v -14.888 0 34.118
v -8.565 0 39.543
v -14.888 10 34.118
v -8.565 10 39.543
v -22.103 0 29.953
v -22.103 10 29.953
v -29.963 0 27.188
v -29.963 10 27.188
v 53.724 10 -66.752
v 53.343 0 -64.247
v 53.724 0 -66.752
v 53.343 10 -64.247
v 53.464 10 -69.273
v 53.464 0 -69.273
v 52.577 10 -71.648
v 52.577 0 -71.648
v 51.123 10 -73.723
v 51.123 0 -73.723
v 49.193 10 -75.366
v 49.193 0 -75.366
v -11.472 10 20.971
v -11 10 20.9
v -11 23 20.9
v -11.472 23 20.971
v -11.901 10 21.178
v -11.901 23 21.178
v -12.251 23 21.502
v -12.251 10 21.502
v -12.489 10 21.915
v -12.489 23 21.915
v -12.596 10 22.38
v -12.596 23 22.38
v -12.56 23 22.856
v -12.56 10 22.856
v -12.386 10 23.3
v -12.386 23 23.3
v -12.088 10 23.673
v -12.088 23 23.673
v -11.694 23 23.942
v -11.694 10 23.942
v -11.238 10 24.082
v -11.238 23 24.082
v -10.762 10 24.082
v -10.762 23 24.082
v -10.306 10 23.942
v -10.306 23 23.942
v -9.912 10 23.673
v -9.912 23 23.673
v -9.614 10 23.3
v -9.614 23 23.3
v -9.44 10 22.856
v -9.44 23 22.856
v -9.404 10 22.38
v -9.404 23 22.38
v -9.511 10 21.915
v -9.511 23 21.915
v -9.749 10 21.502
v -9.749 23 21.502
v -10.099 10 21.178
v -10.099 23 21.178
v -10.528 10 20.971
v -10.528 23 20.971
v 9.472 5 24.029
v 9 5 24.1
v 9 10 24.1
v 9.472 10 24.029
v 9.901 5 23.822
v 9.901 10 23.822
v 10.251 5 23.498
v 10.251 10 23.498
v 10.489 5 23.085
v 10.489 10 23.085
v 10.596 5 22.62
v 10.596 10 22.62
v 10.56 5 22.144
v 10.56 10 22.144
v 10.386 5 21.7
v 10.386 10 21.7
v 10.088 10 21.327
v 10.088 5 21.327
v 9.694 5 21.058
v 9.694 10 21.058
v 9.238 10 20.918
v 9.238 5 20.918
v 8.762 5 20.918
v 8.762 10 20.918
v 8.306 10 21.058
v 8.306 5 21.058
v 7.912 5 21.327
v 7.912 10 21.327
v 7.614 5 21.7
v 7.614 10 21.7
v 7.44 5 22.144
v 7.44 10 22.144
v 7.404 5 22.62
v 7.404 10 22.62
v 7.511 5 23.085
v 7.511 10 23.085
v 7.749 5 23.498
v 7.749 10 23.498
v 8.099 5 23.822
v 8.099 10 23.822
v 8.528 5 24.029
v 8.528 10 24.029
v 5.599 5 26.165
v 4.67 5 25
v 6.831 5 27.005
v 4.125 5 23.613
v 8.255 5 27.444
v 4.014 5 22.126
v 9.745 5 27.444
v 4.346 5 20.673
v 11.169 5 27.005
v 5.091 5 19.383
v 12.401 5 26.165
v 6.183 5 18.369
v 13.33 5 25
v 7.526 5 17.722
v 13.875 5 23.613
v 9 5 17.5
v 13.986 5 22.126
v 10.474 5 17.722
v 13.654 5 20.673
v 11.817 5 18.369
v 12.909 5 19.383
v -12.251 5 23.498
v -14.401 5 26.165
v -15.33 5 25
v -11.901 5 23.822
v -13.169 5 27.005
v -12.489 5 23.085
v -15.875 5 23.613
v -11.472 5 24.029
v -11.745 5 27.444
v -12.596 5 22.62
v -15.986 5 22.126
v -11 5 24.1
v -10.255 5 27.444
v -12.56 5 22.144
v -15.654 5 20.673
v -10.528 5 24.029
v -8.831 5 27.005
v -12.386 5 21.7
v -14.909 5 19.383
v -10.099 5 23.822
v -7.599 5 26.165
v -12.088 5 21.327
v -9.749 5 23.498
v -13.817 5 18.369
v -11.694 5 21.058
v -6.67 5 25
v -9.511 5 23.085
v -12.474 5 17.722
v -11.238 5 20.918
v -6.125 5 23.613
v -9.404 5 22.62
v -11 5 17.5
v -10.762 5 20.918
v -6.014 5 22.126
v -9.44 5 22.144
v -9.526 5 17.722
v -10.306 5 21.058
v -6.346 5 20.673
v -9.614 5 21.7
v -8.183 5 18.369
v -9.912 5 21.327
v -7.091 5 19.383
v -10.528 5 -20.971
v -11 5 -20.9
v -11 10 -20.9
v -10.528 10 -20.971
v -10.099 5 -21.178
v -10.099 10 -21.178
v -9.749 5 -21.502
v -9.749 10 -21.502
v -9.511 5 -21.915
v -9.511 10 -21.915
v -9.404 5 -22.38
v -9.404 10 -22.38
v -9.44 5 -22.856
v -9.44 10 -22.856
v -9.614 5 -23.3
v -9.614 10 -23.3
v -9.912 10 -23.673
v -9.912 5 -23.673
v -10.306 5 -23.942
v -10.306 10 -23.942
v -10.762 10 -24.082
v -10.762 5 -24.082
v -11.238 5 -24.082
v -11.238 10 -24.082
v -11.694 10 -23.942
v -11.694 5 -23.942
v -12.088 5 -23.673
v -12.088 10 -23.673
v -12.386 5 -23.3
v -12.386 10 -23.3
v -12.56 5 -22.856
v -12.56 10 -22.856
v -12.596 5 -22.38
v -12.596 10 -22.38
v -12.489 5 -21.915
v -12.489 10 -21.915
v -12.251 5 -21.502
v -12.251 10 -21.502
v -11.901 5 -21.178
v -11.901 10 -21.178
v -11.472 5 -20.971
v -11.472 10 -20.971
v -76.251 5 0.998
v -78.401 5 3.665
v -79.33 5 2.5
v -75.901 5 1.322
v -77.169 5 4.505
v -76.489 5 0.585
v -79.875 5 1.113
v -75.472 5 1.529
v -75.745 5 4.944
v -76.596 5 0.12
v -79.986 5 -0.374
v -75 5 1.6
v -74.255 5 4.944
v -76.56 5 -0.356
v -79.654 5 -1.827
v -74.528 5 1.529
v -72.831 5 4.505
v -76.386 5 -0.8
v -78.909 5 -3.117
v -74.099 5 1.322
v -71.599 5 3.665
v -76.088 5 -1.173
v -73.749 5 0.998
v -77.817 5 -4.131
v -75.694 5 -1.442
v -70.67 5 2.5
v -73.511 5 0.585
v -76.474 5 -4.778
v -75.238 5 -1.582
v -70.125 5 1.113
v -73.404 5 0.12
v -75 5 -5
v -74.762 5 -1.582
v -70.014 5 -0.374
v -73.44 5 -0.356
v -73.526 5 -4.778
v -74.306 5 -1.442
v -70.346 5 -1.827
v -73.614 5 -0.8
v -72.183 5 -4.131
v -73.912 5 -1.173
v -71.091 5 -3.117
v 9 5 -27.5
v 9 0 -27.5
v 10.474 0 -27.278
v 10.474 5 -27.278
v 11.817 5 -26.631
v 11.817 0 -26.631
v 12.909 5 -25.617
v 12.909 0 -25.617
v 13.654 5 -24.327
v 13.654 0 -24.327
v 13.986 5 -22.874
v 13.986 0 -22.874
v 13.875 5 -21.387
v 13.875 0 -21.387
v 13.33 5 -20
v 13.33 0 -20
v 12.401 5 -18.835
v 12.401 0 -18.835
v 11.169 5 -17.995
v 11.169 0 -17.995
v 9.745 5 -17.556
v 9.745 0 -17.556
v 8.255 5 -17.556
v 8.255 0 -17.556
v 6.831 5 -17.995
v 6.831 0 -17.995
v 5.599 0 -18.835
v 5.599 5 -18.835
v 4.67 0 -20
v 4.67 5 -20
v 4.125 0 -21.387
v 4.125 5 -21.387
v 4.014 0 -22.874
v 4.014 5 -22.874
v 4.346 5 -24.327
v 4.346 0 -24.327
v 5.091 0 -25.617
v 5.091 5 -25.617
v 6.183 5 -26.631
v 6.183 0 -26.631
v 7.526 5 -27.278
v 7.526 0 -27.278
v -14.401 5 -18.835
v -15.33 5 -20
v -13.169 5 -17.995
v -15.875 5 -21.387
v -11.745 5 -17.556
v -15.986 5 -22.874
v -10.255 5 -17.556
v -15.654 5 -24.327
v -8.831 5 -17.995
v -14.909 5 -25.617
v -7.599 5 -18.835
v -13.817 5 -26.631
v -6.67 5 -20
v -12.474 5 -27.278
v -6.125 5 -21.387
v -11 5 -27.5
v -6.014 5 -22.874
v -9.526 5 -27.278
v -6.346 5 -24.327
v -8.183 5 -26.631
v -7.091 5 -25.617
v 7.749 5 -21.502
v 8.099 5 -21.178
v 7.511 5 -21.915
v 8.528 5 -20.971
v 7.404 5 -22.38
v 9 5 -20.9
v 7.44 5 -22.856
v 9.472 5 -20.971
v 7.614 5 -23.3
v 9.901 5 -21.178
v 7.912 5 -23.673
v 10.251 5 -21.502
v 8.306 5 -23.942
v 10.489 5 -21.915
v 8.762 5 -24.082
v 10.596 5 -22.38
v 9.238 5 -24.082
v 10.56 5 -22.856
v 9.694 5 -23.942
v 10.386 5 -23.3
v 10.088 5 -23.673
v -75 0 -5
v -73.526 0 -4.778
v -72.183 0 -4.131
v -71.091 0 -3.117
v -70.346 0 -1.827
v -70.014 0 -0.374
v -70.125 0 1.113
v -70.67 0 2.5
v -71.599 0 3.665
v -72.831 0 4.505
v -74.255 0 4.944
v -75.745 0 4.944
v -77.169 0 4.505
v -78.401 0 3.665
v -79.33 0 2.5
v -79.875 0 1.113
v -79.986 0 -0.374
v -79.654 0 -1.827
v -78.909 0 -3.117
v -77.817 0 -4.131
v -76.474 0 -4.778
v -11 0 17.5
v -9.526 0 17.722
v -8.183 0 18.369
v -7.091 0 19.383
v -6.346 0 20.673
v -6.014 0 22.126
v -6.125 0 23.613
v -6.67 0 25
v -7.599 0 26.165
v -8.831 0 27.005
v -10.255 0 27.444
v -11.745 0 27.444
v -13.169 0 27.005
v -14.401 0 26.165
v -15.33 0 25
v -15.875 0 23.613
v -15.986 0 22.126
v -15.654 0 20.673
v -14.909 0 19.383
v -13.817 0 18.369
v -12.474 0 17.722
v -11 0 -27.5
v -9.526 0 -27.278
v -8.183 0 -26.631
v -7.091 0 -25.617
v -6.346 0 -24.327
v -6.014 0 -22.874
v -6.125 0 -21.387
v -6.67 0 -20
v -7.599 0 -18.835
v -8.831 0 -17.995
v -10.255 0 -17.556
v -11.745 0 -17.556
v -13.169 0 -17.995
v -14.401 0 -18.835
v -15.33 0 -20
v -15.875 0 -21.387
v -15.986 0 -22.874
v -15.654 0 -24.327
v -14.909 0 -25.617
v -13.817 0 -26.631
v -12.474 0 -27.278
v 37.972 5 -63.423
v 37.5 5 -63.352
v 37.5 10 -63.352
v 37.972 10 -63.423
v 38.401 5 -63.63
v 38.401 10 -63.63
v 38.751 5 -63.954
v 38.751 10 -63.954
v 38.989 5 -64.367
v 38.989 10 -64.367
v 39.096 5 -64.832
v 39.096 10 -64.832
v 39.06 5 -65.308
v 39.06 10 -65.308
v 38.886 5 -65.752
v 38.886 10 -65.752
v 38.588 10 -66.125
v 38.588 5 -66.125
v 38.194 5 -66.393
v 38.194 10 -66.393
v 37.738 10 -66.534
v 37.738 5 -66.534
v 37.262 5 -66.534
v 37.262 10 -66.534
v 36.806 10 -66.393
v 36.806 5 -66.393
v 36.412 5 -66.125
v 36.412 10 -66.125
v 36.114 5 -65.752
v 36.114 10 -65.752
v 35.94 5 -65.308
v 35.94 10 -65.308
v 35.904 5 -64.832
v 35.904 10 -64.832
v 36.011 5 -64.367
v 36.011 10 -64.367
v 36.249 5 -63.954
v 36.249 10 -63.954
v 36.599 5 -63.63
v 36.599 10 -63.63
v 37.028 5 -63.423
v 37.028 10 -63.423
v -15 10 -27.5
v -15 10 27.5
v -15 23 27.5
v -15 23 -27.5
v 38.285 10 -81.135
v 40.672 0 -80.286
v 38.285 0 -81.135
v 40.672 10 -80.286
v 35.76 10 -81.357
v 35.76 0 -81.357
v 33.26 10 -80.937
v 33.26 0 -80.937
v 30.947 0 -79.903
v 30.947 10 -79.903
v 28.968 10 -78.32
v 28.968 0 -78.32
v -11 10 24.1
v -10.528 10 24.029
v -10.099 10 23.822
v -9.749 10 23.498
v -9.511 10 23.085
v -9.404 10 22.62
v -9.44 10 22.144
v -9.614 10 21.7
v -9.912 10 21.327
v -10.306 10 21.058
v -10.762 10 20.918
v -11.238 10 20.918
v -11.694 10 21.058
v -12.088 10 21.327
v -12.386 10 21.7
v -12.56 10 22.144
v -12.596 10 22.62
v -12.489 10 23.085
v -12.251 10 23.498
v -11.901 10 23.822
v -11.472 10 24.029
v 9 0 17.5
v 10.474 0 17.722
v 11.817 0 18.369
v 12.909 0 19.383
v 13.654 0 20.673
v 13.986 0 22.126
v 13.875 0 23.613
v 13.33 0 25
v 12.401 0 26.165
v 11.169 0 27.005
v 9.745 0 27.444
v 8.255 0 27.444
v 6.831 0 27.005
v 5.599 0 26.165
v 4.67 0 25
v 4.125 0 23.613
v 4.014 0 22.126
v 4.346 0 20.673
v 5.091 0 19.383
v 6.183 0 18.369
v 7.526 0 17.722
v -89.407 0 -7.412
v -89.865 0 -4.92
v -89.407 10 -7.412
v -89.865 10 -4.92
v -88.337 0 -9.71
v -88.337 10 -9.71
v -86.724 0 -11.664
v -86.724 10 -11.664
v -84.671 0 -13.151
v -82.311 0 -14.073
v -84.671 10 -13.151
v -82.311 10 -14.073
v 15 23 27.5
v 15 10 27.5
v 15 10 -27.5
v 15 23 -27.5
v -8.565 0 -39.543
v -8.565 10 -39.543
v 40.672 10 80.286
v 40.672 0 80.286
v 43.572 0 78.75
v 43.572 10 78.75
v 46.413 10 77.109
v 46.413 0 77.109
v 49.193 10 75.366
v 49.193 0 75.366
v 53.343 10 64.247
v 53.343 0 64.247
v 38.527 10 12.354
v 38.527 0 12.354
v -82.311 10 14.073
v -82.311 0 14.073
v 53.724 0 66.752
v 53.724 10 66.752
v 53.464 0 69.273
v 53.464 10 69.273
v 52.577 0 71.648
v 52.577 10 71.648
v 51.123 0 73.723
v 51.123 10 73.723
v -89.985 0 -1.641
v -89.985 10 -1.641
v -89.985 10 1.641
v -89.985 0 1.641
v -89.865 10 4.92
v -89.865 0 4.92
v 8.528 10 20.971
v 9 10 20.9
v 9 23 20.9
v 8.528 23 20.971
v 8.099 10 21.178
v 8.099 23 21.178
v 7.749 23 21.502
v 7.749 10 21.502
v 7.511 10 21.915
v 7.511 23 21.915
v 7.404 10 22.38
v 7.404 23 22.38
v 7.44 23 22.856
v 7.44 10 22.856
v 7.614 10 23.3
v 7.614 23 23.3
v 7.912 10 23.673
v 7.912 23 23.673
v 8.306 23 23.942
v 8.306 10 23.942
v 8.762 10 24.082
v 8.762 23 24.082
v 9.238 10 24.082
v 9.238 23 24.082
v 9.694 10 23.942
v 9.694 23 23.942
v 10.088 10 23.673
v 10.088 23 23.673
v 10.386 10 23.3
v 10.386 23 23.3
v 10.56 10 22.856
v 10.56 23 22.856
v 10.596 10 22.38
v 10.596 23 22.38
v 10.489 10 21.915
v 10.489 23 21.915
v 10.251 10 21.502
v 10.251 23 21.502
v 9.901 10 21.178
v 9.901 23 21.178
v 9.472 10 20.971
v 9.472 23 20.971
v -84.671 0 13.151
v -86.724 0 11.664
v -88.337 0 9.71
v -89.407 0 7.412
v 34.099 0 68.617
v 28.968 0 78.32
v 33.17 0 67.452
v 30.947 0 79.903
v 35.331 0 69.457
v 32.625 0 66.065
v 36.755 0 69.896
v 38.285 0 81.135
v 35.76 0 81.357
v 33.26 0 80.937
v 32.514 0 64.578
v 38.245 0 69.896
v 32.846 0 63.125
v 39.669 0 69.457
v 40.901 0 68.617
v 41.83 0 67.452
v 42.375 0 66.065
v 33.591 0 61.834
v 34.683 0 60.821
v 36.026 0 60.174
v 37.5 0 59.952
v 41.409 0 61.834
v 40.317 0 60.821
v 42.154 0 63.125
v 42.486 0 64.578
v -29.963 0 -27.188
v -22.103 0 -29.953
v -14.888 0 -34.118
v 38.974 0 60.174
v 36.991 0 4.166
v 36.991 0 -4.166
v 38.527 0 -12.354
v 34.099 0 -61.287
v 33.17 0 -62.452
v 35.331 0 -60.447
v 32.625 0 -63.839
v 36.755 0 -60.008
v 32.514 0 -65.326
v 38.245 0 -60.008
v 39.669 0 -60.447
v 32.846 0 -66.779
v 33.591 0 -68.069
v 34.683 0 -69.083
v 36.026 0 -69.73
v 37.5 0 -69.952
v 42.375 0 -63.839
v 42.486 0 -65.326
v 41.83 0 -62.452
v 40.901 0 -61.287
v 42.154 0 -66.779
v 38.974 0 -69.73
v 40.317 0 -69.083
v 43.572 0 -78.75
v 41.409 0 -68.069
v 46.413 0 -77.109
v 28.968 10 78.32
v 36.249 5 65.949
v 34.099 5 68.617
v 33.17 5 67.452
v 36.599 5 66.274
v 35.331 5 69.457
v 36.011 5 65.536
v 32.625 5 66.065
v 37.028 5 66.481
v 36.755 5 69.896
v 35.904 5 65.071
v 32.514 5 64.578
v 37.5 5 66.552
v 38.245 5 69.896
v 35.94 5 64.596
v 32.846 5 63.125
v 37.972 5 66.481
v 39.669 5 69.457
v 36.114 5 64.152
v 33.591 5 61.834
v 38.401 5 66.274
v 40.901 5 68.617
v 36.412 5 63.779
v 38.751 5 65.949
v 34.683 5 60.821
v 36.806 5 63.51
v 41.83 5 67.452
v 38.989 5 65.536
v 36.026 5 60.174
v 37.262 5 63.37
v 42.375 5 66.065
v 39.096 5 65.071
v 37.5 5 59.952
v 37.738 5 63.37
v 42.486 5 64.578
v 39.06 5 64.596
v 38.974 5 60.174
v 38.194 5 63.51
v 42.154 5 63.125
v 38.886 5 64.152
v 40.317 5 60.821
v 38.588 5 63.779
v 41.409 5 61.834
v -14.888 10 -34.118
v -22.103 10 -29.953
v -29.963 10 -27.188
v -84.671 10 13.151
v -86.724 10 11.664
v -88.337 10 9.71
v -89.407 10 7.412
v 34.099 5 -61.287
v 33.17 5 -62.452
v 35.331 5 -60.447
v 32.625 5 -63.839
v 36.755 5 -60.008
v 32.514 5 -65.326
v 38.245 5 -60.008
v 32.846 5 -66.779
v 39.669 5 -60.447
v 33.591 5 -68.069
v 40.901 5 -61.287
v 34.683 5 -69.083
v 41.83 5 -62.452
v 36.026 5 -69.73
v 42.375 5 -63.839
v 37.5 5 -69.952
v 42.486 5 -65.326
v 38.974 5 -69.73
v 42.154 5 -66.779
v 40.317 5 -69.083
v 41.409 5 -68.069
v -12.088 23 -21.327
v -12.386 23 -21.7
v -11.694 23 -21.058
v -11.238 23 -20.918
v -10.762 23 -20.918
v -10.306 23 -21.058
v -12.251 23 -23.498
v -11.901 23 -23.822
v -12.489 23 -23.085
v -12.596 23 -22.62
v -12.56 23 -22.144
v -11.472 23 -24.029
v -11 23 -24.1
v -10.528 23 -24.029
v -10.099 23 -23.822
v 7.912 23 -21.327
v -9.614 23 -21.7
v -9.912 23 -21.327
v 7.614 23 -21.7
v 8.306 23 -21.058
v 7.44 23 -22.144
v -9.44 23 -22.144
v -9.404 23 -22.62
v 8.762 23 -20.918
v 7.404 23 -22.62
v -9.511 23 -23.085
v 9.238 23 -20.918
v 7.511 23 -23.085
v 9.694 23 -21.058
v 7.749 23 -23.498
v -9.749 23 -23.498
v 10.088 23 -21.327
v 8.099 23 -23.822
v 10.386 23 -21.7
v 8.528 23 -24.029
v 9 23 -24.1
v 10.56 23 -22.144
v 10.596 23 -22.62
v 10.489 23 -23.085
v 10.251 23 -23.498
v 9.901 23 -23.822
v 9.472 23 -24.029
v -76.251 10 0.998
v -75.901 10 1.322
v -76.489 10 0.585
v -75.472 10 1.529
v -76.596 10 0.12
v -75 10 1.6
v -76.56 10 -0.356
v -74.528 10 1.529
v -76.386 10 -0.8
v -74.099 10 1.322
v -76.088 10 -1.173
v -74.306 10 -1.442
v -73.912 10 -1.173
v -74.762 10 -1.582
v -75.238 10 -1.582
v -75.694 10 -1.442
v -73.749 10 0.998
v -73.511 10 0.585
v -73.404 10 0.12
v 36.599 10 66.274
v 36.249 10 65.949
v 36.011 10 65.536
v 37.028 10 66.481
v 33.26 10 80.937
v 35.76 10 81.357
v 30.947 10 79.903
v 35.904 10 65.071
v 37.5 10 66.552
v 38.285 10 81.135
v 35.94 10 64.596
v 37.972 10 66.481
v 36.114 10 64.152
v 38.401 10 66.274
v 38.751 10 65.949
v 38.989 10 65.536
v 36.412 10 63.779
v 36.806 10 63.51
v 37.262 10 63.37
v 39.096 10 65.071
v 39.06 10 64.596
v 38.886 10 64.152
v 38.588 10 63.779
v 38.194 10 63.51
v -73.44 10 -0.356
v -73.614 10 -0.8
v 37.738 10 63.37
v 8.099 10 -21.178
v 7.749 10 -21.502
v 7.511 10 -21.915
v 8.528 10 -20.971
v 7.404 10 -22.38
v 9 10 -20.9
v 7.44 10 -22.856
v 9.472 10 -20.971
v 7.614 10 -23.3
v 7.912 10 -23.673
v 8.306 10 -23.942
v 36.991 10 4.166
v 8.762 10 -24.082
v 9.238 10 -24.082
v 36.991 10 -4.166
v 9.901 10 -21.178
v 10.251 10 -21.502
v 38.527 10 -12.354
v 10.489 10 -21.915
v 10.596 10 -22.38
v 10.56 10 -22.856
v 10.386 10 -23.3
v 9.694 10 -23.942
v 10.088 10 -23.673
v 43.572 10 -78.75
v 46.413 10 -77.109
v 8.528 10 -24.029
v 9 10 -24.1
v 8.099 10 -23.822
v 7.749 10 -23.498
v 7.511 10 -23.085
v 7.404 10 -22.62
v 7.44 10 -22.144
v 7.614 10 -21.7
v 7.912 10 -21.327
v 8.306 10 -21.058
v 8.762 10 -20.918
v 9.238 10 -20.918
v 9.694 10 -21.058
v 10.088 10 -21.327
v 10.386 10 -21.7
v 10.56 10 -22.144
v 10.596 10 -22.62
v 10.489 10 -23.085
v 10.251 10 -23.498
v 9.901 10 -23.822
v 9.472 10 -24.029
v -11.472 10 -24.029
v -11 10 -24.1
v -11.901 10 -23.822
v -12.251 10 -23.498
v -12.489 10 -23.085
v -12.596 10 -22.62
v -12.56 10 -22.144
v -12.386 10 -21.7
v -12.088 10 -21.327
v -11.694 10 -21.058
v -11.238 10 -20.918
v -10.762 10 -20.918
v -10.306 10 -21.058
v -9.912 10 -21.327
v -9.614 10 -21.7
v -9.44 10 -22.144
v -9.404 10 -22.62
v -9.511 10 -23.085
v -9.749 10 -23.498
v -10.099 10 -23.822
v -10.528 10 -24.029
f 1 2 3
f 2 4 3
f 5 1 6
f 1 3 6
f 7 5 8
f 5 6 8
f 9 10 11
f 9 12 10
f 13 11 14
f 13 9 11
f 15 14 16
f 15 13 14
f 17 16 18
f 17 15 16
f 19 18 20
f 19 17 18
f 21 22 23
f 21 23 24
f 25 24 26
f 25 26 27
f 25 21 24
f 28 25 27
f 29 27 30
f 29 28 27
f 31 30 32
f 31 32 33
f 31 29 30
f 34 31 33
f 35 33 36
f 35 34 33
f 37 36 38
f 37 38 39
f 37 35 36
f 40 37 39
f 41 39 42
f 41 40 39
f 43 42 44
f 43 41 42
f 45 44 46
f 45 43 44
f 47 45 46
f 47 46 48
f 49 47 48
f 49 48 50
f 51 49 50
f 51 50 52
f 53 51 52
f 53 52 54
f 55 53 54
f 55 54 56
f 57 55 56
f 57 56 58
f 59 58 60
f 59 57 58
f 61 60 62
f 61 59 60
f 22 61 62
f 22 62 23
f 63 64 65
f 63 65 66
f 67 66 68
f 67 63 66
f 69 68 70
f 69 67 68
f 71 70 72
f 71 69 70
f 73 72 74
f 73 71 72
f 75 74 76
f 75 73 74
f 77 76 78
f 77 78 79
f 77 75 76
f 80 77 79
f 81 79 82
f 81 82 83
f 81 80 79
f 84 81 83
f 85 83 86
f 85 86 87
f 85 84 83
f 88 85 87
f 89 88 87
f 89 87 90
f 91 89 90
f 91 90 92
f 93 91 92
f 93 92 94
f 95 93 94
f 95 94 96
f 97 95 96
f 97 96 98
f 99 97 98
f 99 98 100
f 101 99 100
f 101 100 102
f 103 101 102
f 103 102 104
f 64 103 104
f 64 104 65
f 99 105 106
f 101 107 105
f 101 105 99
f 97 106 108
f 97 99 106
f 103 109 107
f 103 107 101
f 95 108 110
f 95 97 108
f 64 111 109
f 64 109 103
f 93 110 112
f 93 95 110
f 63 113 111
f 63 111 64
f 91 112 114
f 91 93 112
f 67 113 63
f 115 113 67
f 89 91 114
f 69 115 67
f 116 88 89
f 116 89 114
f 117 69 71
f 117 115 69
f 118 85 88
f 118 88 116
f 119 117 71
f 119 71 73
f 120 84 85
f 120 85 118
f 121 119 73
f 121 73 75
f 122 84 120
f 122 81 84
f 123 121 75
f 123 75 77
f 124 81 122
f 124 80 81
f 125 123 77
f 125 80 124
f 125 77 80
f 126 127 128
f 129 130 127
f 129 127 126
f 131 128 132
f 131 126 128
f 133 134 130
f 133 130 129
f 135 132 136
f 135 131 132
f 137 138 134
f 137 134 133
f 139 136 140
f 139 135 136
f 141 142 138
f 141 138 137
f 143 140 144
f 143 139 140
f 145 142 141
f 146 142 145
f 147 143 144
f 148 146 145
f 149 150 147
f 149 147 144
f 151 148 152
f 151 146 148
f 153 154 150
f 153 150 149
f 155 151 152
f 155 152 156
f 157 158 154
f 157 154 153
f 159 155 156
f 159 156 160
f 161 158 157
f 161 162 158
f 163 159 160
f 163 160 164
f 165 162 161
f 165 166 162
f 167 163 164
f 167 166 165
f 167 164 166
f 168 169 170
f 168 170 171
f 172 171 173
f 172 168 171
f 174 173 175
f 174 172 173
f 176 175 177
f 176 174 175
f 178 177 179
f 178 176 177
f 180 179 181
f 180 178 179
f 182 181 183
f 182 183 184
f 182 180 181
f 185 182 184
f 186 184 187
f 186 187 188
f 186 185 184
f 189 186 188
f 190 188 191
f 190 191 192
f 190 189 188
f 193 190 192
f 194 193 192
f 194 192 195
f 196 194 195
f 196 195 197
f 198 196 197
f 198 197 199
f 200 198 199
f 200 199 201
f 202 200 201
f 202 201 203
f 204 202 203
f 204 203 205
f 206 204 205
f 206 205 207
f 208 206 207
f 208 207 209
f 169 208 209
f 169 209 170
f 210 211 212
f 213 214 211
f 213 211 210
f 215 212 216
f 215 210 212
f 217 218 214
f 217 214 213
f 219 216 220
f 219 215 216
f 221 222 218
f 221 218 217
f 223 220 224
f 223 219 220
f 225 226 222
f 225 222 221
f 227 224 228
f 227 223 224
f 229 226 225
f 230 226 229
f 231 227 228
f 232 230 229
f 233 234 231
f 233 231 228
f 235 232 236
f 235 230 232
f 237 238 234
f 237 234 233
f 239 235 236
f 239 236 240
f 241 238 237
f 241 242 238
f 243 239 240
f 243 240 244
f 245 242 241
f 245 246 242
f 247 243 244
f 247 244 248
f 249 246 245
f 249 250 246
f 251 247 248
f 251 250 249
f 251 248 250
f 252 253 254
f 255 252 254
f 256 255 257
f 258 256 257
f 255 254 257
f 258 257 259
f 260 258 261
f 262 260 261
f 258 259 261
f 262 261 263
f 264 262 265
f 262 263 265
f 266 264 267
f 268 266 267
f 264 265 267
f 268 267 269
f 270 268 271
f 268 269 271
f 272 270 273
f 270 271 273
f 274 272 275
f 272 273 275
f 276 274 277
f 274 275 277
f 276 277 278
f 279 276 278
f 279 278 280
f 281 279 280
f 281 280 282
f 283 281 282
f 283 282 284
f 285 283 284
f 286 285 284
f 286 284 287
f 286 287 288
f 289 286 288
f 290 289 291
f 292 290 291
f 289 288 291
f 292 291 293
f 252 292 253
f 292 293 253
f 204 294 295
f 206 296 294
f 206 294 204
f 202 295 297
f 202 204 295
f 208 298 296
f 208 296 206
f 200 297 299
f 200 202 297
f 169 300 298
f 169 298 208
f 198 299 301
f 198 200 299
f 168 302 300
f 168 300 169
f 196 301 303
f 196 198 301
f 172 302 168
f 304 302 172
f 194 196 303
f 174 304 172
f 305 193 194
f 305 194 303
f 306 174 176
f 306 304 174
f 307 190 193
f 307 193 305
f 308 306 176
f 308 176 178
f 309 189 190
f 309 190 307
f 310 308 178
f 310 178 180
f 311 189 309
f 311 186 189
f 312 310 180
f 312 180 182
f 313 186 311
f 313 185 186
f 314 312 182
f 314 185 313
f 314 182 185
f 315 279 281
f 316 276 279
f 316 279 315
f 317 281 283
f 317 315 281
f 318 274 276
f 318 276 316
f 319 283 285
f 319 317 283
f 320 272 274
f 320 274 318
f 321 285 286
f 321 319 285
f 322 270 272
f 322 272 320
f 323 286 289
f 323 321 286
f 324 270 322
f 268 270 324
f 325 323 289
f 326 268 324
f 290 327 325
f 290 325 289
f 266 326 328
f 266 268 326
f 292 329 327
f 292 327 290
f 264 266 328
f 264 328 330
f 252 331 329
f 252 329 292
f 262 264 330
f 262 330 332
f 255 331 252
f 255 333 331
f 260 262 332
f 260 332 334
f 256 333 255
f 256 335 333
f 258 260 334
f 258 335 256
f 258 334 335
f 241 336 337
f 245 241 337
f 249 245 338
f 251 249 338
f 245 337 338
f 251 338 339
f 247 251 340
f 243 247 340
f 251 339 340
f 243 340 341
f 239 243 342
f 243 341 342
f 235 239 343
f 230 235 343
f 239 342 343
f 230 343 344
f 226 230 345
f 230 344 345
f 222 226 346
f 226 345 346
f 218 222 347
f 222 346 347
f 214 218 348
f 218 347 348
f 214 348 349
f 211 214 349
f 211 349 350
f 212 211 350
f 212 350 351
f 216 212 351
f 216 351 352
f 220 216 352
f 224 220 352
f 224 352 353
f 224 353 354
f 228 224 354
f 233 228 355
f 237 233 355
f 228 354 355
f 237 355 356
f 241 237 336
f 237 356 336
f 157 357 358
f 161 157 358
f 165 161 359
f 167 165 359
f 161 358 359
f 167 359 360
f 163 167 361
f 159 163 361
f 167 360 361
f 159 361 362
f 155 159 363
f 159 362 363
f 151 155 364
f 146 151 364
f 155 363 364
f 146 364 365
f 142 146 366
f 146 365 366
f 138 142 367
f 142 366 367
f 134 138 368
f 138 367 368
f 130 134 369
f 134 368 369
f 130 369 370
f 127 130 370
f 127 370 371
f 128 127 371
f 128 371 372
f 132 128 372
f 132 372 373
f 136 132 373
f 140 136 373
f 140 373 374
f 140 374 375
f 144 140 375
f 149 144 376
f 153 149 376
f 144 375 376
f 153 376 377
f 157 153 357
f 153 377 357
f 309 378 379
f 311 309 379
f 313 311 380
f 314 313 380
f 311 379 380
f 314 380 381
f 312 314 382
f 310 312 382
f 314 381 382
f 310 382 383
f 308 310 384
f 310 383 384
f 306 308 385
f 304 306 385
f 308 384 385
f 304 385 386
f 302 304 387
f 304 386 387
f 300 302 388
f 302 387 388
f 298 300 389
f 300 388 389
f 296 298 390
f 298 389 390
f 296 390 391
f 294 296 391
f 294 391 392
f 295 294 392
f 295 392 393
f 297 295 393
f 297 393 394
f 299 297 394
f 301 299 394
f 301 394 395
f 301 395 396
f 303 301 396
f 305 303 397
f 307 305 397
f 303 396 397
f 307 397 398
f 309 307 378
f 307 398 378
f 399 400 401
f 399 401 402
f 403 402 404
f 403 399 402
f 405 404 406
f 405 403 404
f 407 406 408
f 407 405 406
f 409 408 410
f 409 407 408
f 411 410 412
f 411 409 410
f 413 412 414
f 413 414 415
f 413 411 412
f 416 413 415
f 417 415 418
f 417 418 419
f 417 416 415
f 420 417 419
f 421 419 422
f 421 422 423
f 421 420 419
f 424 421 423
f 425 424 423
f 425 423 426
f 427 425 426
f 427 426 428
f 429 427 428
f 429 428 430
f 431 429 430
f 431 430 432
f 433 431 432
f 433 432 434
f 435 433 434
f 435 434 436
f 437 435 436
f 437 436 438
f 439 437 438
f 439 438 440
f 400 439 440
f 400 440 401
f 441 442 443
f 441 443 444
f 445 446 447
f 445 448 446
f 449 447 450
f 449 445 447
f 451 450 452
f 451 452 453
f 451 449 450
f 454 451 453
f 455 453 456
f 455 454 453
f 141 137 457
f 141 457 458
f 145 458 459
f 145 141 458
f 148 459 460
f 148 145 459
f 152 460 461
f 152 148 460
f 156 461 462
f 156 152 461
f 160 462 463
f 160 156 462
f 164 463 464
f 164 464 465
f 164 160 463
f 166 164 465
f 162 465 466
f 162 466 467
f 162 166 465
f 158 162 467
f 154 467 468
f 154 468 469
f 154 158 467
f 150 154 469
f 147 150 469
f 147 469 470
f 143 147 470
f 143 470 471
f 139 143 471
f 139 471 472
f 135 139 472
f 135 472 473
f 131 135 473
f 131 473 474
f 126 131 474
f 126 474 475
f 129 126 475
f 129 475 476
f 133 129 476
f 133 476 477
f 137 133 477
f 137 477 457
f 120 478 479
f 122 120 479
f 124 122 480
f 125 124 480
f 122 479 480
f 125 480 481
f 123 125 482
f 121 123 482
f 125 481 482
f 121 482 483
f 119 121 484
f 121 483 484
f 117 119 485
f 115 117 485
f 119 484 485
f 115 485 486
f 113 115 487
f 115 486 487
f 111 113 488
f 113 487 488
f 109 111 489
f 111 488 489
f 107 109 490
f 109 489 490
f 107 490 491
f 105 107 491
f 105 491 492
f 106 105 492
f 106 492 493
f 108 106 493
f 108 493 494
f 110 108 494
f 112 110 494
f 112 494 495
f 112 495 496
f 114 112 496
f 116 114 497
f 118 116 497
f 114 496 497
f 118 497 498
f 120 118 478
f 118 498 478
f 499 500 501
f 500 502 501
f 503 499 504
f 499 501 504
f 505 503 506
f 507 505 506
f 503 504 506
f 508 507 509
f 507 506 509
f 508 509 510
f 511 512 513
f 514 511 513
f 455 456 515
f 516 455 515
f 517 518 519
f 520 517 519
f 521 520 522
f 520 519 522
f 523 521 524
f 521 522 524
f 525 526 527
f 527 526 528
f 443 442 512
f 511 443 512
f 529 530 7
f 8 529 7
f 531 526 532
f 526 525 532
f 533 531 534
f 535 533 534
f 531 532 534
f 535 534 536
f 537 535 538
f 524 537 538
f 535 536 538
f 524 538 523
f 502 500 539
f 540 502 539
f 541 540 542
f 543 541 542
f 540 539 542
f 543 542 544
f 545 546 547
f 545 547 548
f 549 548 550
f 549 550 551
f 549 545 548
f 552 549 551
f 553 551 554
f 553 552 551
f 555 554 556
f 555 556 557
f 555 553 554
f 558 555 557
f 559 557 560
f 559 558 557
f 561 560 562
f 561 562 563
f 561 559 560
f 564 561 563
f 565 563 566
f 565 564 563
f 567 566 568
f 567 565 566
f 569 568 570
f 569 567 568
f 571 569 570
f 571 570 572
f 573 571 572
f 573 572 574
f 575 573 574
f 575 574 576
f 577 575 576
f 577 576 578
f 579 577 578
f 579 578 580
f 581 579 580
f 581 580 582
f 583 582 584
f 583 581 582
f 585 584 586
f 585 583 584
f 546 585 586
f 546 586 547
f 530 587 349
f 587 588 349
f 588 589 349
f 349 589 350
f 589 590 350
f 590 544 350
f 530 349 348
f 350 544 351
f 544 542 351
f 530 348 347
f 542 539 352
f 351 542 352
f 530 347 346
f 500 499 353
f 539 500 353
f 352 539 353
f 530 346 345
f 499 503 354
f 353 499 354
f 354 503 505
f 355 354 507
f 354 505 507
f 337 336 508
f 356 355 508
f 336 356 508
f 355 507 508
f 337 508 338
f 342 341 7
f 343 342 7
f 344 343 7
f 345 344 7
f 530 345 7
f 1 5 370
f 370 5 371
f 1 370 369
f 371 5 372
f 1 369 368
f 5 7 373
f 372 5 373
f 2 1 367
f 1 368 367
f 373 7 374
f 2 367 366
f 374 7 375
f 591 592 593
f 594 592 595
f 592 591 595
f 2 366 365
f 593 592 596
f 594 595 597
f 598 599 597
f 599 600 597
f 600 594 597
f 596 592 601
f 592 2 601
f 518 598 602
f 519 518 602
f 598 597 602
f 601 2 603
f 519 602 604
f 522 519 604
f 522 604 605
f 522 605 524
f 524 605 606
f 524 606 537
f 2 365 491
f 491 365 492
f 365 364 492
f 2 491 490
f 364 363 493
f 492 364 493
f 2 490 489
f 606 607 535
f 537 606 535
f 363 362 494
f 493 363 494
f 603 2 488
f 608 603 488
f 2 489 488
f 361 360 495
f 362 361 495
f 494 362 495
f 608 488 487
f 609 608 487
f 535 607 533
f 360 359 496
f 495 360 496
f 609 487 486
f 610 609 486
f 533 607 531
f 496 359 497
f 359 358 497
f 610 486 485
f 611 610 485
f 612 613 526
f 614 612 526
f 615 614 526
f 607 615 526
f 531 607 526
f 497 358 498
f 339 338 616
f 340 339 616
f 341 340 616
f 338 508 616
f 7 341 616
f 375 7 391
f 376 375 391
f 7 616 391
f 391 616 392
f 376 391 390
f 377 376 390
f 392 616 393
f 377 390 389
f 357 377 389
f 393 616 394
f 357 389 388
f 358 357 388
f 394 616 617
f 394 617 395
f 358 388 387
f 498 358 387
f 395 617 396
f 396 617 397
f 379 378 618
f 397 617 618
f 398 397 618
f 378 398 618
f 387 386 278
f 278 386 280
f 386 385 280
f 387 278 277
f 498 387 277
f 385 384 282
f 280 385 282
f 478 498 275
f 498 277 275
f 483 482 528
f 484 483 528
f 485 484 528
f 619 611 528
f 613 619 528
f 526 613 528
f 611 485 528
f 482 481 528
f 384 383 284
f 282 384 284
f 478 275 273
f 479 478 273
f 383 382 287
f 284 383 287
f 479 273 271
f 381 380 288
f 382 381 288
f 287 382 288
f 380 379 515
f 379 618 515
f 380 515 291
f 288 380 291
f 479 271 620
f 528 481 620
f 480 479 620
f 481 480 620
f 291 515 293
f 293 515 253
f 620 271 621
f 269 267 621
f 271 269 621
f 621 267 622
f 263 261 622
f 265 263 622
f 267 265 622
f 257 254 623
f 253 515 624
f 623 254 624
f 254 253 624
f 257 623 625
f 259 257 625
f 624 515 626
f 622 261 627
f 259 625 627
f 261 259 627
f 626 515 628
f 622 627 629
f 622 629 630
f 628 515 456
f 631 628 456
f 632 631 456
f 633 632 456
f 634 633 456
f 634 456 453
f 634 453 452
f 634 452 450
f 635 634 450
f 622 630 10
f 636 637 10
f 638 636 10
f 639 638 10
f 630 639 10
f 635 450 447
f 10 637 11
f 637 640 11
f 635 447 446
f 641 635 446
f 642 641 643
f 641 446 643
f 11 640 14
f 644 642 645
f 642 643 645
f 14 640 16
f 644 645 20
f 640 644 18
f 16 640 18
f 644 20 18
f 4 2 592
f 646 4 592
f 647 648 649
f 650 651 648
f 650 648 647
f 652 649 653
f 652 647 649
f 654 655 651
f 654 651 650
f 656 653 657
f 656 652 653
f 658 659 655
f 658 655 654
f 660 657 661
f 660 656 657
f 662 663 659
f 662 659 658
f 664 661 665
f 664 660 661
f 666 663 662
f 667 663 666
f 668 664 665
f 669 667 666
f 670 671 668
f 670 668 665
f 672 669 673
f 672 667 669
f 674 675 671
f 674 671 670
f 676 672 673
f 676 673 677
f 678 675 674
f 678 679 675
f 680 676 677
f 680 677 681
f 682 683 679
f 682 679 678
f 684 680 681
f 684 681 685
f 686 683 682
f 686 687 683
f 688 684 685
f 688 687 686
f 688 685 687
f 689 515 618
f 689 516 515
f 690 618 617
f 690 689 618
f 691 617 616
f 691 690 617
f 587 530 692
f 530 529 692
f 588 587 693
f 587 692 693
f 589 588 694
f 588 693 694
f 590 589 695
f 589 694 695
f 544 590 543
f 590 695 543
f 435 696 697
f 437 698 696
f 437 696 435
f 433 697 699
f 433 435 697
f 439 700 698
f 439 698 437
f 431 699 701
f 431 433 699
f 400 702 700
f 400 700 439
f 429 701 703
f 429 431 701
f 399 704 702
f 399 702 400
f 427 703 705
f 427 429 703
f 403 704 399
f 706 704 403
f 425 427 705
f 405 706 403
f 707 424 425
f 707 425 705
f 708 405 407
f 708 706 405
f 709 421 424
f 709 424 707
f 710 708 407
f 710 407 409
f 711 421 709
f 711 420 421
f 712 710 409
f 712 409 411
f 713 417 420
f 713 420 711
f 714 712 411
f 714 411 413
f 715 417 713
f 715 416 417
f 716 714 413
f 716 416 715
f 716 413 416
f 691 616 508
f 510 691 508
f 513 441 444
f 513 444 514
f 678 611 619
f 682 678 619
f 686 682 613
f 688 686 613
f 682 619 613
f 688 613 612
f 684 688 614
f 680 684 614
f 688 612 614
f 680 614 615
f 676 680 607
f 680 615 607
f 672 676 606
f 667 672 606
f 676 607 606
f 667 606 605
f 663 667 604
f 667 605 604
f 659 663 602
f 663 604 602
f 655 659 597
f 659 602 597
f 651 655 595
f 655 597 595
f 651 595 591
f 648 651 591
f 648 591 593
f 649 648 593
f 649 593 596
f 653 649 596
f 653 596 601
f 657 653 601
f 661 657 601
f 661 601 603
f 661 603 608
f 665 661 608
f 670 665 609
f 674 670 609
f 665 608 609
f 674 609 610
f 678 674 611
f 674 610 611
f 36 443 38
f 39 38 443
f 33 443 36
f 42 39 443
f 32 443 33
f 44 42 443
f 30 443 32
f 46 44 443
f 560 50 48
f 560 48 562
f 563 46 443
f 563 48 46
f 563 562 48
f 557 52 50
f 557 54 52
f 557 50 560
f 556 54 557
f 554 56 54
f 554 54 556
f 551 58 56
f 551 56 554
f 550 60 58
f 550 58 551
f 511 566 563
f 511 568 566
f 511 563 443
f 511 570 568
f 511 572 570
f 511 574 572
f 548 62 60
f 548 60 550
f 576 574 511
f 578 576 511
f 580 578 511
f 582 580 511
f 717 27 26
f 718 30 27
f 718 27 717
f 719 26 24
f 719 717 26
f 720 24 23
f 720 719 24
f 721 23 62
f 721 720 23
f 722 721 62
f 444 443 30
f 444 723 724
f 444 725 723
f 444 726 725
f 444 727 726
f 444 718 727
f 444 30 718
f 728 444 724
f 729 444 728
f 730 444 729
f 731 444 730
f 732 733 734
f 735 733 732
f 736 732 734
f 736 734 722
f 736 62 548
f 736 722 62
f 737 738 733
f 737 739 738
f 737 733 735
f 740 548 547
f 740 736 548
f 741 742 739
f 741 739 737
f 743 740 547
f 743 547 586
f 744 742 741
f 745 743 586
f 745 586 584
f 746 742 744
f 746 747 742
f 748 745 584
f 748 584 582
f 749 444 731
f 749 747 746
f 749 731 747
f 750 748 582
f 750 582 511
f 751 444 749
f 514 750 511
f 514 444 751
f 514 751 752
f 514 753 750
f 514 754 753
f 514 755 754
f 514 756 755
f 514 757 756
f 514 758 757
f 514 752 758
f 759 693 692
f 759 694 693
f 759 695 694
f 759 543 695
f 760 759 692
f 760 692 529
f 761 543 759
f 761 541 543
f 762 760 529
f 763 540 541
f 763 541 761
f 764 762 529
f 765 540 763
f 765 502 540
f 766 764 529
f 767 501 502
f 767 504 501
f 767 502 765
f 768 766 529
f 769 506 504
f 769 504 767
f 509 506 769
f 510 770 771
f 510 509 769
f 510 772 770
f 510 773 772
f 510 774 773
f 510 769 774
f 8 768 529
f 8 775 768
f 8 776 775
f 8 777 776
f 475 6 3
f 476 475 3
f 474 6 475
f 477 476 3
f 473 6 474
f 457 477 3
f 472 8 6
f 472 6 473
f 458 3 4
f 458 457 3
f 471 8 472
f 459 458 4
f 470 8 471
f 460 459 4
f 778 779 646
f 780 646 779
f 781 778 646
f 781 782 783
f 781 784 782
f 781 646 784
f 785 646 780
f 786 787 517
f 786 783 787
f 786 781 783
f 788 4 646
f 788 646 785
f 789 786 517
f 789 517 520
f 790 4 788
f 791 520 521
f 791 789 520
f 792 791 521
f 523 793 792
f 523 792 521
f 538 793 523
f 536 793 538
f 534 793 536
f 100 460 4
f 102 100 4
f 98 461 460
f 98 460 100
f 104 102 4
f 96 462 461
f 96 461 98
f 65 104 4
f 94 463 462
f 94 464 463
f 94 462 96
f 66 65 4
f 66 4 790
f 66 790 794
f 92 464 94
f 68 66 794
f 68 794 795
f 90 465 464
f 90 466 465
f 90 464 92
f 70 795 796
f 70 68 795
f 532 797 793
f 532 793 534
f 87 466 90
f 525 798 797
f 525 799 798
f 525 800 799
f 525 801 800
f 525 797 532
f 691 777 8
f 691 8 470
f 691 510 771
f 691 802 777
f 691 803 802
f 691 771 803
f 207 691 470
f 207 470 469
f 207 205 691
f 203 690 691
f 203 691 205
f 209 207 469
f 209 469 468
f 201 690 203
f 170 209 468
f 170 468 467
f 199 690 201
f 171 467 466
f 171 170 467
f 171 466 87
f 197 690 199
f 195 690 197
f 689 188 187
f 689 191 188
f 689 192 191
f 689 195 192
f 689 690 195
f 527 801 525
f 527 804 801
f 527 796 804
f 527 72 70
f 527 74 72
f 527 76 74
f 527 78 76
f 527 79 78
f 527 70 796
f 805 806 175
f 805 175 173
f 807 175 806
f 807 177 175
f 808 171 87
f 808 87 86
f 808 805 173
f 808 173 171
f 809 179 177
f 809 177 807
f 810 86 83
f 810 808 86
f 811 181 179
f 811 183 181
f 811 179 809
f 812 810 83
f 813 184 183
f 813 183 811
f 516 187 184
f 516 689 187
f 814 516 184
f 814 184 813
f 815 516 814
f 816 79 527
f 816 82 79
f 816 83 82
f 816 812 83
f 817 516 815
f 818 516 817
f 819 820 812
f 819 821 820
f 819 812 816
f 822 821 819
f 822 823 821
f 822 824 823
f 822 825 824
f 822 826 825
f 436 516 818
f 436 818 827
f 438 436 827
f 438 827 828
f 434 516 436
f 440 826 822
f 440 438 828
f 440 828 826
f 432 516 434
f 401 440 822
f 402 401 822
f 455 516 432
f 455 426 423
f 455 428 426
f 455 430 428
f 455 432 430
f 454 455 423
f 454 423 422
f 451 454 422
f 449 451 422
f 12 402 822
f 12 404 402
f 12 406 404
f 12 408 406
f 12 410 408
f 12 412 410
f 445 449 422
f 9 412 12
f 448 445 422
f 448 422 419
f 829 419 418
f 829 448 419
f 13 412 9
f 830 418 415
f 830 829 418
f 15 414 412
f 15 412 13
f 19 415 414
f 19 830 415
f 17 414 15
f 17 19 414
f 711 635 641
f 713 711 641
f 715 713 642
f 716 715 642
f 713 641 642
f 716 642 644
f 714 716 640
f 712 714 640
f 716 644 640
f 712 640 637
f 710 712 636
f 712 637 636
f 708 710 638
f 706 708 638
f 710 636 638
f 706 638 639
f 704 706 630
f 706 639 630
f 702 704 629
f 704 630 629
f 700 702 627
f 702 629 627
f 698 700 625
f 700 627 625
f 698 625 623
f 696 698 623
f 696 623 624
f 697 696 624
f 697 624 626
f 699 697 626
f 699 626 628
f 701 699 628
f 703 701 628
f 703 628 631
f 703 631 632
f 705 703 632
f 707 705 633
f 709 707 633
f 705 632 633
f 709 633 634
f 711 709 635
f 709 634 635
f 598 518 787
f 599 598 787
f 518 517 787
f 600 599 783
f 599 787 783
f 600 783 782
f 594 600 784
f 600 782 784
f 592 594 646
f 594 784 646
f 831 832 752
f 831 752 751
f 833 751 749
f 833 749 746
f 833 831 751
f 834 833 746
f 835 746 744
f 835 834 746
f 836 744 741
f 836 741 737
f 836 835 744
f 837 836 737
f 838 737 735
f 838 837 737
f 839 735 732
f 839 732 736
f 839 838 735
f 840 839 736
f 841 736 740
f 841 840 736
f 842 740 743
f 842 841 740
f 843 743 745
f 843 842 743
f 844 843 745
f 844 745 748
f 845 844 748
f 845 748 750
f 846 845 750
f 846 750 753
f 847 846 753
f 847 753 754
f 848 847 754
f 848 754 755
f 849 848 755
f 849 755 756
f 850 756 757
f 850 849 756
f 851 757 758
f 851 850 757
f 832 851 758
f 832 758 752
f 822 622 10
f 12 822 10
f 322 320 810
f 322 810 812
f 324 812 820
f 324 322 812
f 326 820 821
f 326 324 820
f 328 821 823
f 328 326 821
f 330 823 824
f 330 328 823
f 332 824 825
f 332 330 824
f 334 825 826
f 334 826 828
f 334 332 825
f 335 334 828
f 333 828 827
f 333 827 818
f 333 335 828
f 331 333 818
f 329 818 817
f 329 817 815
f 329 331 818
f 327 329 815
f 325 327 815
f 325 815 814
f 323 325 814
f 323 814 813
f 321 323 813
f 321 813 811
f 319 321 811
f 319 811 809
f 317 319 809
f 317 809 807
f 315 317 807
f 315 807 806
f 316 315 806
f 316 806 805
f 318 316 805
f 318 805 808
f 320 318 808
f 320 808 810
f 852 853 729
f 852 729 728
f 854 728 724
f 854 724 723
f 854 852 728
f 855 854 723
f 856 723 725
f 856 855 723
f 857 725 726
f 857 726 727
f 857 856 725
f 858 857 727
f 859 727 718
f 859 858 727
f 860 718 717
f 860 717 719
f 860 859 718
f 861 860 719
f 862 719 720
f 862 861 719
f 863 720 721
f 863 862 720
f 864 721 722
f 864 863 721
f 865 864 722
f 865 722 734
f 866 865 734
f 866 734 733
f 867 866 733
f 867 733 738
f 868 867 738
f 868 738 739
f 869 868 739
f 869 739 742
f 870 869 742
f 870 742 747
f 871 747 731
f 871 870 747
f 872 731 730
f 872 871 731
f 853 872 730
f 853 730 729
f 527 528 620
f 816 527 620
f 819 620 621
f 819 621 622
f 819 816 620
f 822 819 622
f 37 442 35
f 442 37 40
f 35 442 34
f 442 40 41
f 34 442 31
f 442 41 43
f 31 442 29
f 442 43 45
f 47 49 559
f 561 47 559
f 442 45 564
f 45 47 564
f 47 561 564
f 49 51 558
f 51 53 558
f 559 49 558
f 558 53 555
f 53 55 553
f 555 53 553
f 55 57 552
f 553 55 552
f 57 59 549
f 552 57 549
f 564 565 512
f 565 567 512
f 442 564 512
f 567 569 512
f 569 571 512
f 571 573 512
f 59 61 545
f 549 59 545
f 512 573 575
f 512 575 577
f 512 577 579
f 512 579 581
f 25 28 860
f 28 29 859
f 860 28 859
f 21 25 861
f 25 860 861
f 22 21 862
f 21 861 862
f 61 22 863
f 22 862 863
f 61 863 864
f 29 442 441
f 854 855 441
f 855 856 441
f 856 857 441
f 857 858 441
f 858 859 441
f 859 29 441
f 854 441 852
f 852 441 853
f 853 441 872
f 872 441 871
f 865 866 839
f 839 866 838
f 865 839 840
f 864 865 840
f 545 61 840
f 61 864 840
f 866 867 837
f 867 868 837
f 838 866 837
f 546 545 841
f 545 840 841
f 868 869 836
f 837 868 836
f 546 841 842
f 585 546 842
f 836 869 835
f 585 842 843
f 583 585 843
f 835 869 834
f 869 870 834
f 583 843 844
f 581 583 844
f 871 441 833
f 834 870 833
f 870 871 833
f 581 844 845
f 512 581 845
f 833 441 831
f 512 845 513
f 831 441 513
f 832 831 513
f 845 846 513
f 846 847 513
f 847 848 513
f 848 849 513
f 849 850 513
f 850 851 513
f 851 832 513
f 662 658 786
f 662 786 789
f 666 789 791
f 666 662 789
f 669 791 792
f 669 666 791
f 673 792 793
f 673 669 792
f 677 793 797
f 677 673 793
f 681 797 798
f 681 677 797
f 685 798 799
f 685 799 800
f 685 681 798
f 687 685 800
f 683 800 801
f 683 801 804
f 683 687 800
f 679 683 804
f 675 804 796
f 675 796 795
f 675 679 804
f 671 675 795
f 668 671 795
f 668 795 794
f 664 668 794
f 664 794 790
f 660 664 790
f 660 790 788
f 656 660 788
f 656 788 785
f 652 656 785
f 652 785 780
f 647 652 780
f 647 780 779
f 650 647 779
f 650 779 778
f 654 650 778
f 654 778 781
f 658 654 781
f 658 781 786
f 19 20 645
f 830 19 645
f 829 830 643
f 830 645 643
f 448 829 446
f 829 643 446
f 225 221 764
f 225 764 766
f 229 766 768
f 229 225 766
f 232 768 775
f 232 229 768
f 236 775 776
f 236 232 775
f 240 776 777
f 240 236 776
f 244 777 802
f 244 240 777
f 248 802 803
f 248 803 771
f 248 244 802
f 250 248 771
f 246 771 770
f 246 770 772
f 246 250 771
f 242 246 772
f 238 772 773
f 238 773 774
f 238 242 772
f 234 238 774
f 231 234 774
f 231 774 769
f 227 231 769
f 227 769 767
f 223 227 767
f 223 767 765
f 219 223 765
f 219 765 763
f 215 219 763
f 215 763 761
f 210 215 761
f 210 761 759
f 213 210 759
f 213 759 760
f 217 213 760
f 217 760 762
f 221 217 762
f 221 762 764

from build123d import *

# Parameters (mm, degrees)
SKETCH1_R           = 1.6
BOSS_EXTRUDE1_DEPTH = 10
FILLET1_R           = 10
FILLET2_R           = 45
SKETCH3_W           = 30
SKETCH3_H           = 55
SKETCH3_R           = 1.6
BOSS_EXTRUDE3_DEPTH = 13
SKETCH4_R           = 5
CUT_EXTRUDE1_DEPTH  = 5


with BuildPart() as part:
    # Sketch1 → Boss-Extrude1 (new body)
    # profile 1 of 7: a face of its own
    with BuildSketch(Plane(origin=(0, 0, 0), x_dir=(1, 0, 0), z_dir=(0, 1, 0))):
        with BuildLine():
            Line((-17.5, 30.310889132), (-89.147201462, 12.360277968))
            ThreePointArc((-89.147201462, 12.360277968), (-90, 0), (-89.147201462, -12.360277968))
            Line((-89.147201462, -12.360277968), (-17.5, -30.310889132))
            ThreePointArc((-17.5, -30.310889132), (-35, 0), (-17.5, 30.310889132))
        make_face()
        with Locations(Location((-75, 0, 0), (0, 0, 270))):
            Circle(SKETCH1_R, mode=Mode.SUBTRACT)
    # profile 2 of 7: a face of its own
    with BuildSketch(Plane(origin=(0, 0, 0), x_dir=(1, 0, 0), z_dir=(0, 1, 0))):
        Polygon((-17.5, 30.310889132), (-17.5, -30.310889132), (35, 0), align=None)
        with Locations(Location((-11, -22.5, 0), (0, 0, 270))):
            Circle(SKETCH1_R, mode=Mode.SUBTRACT)
        with Locations(Location((-11, 22.5, 0), (0, 0, 270))):
            Circle(SKETCH1_R, mode=Mode.SUBTRACT)
    # profile 3 of 7: a face of its own
    with BuildSketch(Plane(origin=(0, 0, 0), x_dir=(1, 0, 0), z_dir=(0, 1, 0))):
        with BuildLine():
            Line((-17.5, -30.310889132), (-17.5, 30.310889132))
            ThreePointArc((-17.5, 30.310889132), (-35, 0), (-17.5, -30.310889132))
        make_face()
    # profile 4 of 7: a face of its own
    with BuildSketch(Plane(origin=(0, 0, 0), x_dir=(1, 0, 0), z_dir=(0, 1, 0))):
        with BuildLine():
            ThreePointArc((35, 0), (17.5, 30.310889132), (-17.5, 30.310889132))
            Line((-17.5, 30.310889132), (35, 0))
        make_face()
        with Locations(Location((9, 22.5, 0), (0, 0, 270))):
            Circle(SKETCH1_R, mode=Mode.SUBTRACT)
    # profile 5 of 7: a face of its own
    with BuildSketch(Plane(origin=(0, 0, 0), x_dir=(1, 0, 0), z_dir=(0, 1, 0))):
        with BuildLine():
            Line((33.869286013, 83.383880127), (-17.5, 30.310889132))
            ThreePointArc((-17.5, 30.310889132), (17.5, 30.310889132), (35, 0))
            Line((35, 0), (55.277915449, 71.023602159))
            ThreePointArc((55.277915449, 71.023602159), (45, 77.942286341), (33.869286013, 83.383880127))
        make_face()
        with Locations(Location((37.5, 64.951905284, 0), (0, 0, 270))):
            Circle(SKETCH1_R, mode=Mode.SUBTRACT)
    # profile 6 of 7: a face of its own
    with BuildSketch(Plane(origin=(0, 0, 0), x_dir=(1, 0, 0), z_dir=(0, 1, 0))):
        with BuildLine():
            Line((35, 0), (-17.5, -30.310889132))
            ThreePointArc((-17.5, -30.310889132), (17.5, -30.310889132), (35, 0))
        make_face()
        with Locations(Location((9, -22.5, 0), (0, 0, 270))):
            Circle(SKETCH1_R, mode=Mode.SUBTRACT)
    # profile 7 of 7: a face of its own
    with BuildSketch(Plane(origin=(0, 0, 0), x_dir=(1, 0, 0), z_dir=(0, 1, 0))):
        with BuildLine():
            ThreePointArc((35, 0), (17.5, -30.310889132), (-17.5, -30.310889132))
            Line((-17.5, -30.310889132), (33.869286013, -83.383880127))
            ThreePointArc((33.869286013, -83.383880127), (45, -77.942286341), (55.277915449, -71.023602159))
            Line((55.277915449, -71.023602159), (35, 0))
        make_face()
        with Locations(Location((37.5, -64.951905284, 0), (0, 0, 270))):
            Circle(SKETCH1_R, mode=Mode.SUBTRACT)
    extrude(amount=BOSS_EXTRUDE1_DEPTH)

    # Fillet1
    fillet1_edges = [part.edges().sort_by_distance(p)[0] for p in [
        (-89.147201462, 5, 12.360277968),
        (-89.147201462, 5, -12.360277968),
        (33.869286013, 5, -83.383880127),
        (55.277915449, 5, -71.023602159),
        (55.277915449, 5, 71.023602159),
        (33.869286013, 5, 83.383880127),
    ]]
    fillet(fillet1_edges, radius=FILLET1_R)

    # Fillet2
    fillet2_edges = [part.edges().sort_by_distance(p)[0] for p in [
        (-17.5, 5, -30.310889132),
        (35, 5, 0),
        (-17.5, 5, 30.310889132),
    ]]
    fillet(fillet2_edges, radius=FILLET2_R)

    # Sketch4 → Cut-Extrude1 (cut)
    with BuildSketch(Plane.XZ):
        with Locations(Location((-11, 22.5, 0), (0, 0, 270))):
            Circle(SKETCH4_R)
        with Locations(Location((9, 22.5, 0), (0, 0, 270))):
            Circle(SKETCH4_R)
        with Locations(Location((9, -22.5, 0), (0, 0, 270))):
            Circle(SKETCH4_R)
        with Locations(Location((-11, -22.5, 0), (0, 0, 270))):
            Circle(SKETCH4_R)
        with Locations(Location((-75, 0, 0), (0, 0, 270))):
            Circle(SKETCH4_R)
        with Locations(Location((37.5, -64.951905284, 0), (0, 0, 270))):
            Circle(SKETCH4_R)
        with Locations(Location((37.5, 64.951905284, 0), (0, 0, 270))):
            Circle(SKETCH4_R)
    extrude(amount=-CUT_EXTRUDE1_DEPTH, mode=Mode.SUBTRACT)


with BuildPart() as body_2:
    # Sketch3 → Boss-Extrude3 (new body)
    with BuildSketch(Plane(origin=(0, 10, 0), x_dir=(1, 0, 0), z_dir=(0, 1, 0))):
        Rectangle(SKETCH3_W, SKETCH3_H)
        with Locations(Location((-11, 22.5, 0), (0, 0, 90))):
            Circle(SKETCH3_R, mode=Mode.SUBTRACT)
        with Locations(Location((9, 22.5, 0), (0, 0, 90))):
            Circle(SKETCH3_R, mode=Mode.SUBTRACT)
        with Locations(Location((-11, -22.5, 0), (0, 0, 90))):
            Circle(SKETCH3_R, mode=Mode.SUBTRACT)
        with Locations(Location((9, -22.5, 0), (0, 0, 90))):
            Circle(SKETCH3_R, mode=Mode.SUBTRACT)
    extrude(amount=BOSS_EXTRUDE3_DEPTH)


solid = Compound([part.part, body_2.part])
